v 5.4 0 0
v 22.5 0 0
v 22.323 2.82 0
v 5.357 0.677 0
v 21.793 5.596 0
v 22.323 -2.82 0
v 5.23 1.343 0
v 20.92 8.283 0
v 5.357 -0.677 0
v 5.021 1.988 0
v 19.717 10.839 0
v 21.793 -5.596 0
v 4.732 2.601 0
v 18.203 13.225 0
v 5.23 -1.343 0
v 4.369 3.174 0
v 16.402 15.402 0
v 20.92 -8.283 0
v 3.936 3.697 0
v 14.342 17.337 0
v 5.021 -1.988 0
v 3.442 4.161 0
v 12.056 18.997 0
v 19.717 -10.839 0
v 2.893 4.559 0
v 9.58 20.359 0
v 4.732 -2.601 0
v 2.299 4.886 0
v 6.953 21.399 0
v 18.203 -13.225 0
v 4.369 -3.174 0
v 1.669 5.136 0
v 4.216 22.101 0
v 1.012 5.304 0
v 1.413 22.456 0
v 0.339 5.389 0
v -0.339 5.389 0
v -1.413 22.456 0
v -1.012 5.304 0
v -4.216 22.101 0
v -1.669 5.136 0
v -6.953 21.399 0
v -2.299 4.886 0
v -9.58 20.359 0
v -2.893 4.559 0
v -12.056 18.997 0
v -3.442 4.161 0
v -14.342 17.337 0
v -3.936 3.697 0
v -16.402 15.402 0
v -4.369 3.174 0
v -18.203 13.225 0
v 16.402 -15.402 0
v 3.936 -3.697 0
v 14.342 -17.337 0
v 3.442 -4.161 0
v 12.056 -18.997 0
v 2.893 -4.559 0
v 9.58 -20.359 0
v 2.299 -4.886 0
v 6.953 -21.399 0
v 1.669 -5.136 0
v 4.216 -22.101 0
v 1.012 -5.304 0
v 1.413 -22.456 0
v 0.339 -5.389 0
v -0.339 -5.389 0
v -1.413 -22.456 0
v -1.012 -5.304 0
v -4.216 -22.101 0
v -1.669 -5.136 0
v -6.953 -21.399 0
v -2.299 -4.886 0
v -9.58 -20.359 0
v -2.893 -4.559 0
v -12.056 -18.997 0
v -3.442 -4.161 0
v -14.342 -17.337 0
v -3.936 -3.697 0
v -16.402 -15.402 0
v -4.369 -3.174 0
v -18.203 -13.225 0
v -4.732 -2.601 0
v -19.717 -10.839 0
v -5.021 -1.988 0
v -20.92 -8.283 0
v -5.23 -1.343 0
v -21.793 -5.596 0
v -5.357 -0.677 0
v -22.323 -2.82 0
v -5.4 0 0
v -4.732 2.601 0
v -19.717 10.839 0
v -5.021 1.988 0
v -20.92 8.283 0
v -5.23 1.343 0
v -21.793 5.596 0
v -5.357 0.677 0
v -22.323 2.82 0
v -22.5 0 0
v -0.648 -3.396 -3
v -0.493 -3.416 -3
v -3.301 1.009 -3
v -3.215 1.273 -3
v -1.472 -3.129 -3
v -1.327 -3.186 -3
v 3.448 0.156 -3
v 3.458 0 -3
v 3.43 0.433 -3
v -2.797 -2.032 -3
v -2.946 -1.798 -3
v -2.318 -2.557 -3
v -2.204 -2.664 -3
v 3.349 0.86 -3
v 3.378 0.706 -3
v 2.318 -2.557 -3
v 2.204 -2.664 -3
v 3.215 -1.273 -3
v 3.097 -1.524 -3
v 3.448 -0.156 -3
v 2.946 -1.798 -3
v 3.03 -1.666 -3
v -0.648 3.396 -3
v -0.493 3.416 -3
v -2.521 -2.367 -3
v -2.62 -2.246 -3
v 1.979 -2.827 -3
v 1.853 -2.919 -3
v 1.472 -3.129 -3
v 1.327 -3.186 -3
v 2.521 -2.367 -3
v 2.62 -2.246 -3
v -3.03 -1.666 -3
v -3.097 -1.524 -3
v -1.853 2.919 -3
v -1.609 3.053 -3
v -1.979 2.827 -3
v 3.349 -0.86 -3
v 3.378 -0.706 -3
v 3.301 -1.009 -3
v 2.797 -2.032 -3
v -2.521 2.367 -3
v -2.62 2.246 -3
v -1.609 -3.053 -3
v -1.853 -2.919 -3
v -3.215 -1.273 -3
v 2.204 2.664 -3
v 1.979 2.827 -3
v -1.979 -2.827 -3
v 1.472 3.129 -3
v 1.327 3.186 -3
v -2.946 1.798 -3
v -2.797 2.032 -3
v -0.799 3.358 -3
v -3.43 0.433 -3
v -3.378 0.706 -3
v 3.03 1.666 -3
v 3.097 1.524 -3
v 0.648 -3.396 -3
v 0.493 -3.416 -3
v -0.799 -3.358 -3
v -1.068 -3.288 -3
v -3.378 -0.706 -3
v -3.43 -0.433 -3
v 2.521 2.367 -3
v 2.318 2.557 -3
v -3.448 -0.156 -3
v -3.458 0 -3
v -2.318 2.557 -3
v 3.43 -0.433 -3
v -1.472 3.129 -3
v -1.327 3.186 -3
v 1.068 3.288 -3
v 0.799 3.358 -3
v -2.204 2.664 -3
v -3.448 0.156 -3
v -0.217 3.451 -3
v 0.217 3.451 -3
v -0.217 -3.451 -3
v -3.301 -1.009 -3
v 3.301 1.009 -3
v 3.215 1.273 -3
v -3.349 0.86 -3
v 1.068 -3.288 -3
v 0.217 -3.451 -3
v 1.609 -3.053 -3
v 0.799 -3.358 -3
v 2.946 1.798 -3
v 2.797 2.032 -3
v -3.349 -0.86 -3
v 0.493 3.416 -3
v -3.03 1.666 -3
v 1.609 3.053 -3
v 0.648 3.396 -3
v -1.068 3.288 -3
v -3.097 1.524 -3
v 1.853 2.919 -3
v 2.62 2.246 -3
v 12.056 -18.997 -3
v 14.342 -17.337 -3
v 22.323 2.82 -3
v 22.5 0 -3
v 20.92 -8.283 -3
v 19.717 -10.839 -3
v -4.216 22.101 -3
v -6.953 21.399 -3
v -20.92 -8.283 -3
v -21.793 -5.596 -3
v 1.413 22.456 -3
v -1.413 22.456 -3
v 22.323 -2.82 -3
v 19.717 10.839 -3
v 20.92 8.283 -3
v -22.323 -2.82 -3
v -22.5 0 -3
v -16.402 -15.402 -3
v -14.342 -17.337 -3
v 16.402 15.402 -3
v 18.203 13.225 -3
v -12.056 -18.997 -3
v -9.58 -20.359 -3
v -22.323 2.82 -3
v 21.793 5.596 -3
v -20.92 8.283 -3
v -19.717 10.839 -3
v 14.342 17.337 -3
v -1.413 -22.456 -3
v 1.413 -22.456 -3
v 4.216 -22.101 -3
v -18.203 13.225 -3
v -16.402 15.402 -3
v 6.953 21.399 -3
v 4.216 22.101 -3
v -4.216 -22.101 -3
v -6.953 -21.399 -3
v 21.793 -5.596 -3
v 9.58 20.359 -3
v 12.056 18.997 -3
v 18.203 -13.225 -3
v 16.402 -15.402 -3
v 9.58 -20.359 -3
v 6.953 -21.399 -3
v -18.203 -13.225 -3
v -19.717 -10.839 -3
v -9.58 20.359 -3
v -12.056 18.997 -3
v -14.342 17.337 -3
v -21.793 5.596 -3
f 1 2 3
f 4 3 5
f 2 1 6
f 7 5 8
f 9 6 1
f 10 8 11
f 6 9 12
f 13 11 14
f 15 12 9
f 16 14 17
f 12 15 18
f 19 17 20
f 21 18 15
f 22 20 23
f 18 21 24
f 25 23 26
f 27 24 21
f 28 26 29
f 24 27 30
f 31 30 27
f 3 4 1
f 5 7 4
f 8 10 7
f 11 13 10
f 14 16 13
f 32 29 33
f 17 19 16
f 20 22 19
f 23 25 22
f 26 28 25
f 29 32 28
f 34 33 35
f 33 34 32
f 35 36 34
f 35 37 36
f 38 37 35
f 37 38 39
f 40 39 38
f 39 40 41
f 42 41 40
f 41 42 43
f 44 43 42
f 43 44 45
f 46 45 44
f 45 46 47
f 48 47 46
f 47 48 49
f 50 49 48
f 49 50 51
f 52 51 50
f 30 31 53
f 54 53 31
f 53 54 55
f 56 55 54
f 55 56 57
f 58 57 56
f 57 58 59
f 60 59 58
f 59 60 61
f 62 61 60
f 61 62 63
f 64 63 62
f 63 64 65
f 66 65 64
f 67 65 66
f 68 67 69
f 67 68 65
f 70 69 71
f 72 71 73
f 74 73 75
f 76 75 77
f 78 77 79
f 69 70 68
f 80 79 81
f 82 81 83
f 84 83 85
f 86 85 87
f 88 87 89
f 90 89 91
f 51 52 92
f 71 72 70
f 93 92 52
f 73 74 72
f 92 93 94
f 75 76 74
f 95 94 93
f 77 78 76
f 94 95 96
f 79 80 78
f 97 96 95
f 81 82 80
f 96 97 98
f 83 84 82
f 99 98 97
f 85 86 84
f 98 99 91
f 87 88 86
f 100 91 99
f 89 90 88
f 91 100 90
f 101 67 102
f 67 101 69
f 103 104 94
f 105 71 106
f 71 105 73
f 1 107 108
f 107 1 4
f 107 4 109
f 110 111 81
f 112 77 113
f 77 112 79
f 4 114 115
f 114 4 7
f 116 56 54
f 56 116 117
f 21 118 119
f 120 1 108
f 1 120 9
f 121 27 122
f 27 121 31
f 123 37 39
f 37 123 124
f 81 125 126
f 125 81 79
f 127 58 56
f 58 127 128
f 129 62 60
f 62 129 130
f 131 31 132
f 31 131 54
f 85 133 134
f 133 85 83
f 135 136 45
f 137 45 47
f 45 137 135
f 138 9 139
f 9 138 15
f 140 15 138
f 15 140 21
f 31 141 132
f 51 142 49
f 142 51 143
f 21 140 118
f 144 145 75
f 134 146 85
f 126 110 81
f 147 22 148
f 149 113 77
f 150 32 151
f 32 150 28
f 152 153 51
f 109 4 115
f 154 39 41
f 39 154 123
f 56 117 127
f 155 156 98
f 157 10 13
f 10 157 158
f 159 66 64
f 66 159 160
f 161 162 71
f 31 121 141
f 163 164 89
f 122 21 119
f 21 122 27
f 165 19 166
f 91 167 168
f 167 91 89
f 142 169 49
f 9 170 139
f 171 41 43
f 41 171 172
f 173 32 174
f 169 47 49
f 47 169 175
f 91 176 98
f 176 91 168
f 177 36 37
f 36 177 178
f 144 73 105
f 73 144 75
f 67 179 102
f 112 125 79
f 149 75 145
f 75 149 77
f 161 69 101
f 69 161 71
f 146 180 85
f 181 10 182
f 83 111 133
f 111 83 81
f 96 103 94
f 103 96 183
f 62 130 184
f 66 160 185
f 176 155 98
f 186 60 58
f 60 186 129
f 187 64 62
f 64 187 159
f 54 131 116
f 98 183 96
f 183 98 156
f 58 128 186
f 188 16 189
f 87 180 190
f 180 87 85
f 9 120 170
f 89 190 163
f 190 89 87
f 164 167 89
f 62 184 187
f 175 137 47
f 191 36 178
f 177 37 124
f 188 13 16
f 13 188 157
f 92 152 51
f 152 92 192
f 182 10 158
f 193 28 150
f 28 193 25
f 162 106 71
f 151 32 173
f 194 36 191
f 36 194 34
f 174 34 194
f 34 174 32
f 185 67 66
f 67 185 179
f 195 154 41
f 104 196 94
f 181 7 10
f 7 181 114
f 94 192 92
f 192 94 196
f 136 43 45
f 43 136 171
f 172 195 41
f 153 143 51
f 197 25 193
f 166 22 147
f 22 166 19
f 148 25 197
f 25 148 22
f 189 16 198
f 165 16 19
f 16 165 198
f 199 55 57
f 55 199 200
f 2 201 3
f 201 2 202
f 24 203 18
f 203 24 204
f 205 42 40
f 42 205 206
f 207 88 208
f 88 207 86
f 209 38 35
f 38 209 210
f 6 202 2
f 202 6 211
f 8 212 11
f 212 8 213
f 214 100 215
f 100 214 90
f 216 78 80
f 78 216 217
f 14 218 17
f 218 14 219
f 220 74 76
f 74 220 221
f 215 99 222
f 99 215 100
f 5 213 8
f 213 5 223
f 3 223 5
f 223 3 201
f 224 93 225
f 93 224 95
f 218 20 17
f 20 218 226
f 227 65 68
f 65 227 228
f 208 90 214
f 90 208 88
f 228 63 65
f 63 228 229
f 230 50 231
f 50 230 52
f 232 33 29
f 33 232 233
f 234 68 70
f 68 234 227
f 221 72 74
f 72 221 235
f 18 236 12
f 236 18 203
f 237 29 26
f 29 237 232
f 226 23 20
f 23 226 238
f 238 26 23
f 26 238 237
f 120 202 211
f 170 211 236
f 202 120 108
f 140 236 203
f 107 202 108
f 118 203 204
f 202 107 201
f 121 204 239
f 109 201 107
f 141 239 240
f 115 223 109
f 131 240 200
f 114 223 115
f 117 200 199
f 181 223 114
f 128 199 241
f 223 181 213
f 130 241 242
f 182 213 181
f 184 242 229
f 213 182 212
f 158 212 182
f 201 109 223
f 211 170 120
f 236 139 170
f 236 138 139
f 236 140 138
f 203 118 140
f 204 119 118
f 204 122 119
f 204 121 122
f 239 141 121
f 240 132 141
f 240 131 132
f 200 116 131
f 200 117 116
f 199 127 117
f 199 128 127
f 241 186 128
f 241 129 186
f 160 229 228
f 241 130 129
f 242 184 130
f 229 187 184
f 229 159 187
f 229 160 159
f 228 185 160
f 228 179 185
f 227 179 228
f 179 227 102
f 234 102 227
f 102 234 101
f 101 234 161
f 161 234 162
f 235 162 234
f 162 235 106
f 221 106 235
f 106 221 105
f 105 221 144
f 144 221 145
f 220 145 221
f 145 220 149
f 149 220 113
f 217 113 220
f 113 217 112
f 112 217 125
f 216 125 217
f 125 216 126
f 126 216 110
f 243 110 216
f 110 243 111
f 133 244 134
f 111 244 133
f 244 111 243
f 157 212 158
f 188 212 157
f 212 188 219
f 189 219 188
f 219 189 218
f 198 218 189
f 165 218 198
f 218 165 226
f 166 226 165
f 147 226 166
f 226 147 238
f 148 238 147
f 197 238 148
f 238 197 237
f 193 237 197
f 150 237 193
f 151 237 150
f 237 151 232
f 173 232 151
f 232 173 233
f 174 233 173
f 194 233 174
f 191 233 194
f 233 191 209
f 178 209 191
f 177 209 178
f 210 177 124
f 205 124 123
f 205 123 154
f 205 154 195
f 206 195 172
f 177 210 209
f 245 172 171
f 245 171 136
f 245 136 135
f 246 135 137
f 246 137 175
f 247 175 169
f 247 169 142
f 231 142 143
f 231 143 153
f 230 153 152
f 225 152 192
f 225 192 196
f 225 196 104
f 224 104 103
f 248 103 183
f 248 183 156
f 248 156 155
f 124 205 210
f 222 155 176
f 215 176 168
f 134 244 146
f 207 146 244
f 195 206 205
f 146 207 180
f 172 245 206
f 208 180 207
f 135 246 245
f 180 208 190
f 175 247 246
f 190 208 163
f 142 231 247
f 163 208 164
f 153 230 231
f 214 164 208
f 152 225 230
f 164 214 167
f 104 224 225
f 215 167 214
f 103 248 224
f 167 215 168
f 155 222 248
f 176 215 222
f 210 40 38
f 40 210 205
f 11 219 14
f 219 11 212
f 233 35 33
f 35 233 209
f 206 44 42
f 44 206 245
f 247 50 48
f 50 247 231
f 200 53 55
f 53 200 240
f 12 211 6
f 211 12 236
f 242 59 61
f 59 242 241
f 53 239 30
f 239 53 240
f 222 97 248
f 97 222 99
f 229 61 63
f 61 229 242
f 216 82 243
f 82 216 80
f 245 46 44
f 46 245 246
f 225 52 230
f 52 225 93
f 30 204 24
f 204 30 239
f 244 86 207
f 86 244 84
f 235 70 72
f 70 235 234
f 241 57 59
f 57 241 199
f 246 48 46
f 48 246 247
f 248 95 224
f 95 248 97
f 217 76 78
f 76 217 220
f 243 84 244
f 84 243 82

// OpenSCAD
$fn = 50;

difference() {
	union() {
		translate(v = [0, 0, -3.0]) {
			cylinder(h = 3, r = 22.5);
		}
	}
	union() {
		translate(v = [0, 0, 0]) {
			rotate(a = [0, 0, 0]) {
				difference() {
					union() {
						translate(v = [0, 0, -6.0]) {
							cylinder(h = 6, r = 2.6);
						}
						translate(v = [0, 0, -3.9]) {
							cylinder(h = 3.9, r1 = 2.875, r2 = 5.4);
						}
						translate(v = [0, 0, -6.0]) {
							cylinder(h = 6, r = 2.875);
						}
						translate(v = [0, 0, -6.0]) {
							cylinder(h = 6, r = 2.6);
						}
					}
					union();
				}
			}
		}
	}
}
